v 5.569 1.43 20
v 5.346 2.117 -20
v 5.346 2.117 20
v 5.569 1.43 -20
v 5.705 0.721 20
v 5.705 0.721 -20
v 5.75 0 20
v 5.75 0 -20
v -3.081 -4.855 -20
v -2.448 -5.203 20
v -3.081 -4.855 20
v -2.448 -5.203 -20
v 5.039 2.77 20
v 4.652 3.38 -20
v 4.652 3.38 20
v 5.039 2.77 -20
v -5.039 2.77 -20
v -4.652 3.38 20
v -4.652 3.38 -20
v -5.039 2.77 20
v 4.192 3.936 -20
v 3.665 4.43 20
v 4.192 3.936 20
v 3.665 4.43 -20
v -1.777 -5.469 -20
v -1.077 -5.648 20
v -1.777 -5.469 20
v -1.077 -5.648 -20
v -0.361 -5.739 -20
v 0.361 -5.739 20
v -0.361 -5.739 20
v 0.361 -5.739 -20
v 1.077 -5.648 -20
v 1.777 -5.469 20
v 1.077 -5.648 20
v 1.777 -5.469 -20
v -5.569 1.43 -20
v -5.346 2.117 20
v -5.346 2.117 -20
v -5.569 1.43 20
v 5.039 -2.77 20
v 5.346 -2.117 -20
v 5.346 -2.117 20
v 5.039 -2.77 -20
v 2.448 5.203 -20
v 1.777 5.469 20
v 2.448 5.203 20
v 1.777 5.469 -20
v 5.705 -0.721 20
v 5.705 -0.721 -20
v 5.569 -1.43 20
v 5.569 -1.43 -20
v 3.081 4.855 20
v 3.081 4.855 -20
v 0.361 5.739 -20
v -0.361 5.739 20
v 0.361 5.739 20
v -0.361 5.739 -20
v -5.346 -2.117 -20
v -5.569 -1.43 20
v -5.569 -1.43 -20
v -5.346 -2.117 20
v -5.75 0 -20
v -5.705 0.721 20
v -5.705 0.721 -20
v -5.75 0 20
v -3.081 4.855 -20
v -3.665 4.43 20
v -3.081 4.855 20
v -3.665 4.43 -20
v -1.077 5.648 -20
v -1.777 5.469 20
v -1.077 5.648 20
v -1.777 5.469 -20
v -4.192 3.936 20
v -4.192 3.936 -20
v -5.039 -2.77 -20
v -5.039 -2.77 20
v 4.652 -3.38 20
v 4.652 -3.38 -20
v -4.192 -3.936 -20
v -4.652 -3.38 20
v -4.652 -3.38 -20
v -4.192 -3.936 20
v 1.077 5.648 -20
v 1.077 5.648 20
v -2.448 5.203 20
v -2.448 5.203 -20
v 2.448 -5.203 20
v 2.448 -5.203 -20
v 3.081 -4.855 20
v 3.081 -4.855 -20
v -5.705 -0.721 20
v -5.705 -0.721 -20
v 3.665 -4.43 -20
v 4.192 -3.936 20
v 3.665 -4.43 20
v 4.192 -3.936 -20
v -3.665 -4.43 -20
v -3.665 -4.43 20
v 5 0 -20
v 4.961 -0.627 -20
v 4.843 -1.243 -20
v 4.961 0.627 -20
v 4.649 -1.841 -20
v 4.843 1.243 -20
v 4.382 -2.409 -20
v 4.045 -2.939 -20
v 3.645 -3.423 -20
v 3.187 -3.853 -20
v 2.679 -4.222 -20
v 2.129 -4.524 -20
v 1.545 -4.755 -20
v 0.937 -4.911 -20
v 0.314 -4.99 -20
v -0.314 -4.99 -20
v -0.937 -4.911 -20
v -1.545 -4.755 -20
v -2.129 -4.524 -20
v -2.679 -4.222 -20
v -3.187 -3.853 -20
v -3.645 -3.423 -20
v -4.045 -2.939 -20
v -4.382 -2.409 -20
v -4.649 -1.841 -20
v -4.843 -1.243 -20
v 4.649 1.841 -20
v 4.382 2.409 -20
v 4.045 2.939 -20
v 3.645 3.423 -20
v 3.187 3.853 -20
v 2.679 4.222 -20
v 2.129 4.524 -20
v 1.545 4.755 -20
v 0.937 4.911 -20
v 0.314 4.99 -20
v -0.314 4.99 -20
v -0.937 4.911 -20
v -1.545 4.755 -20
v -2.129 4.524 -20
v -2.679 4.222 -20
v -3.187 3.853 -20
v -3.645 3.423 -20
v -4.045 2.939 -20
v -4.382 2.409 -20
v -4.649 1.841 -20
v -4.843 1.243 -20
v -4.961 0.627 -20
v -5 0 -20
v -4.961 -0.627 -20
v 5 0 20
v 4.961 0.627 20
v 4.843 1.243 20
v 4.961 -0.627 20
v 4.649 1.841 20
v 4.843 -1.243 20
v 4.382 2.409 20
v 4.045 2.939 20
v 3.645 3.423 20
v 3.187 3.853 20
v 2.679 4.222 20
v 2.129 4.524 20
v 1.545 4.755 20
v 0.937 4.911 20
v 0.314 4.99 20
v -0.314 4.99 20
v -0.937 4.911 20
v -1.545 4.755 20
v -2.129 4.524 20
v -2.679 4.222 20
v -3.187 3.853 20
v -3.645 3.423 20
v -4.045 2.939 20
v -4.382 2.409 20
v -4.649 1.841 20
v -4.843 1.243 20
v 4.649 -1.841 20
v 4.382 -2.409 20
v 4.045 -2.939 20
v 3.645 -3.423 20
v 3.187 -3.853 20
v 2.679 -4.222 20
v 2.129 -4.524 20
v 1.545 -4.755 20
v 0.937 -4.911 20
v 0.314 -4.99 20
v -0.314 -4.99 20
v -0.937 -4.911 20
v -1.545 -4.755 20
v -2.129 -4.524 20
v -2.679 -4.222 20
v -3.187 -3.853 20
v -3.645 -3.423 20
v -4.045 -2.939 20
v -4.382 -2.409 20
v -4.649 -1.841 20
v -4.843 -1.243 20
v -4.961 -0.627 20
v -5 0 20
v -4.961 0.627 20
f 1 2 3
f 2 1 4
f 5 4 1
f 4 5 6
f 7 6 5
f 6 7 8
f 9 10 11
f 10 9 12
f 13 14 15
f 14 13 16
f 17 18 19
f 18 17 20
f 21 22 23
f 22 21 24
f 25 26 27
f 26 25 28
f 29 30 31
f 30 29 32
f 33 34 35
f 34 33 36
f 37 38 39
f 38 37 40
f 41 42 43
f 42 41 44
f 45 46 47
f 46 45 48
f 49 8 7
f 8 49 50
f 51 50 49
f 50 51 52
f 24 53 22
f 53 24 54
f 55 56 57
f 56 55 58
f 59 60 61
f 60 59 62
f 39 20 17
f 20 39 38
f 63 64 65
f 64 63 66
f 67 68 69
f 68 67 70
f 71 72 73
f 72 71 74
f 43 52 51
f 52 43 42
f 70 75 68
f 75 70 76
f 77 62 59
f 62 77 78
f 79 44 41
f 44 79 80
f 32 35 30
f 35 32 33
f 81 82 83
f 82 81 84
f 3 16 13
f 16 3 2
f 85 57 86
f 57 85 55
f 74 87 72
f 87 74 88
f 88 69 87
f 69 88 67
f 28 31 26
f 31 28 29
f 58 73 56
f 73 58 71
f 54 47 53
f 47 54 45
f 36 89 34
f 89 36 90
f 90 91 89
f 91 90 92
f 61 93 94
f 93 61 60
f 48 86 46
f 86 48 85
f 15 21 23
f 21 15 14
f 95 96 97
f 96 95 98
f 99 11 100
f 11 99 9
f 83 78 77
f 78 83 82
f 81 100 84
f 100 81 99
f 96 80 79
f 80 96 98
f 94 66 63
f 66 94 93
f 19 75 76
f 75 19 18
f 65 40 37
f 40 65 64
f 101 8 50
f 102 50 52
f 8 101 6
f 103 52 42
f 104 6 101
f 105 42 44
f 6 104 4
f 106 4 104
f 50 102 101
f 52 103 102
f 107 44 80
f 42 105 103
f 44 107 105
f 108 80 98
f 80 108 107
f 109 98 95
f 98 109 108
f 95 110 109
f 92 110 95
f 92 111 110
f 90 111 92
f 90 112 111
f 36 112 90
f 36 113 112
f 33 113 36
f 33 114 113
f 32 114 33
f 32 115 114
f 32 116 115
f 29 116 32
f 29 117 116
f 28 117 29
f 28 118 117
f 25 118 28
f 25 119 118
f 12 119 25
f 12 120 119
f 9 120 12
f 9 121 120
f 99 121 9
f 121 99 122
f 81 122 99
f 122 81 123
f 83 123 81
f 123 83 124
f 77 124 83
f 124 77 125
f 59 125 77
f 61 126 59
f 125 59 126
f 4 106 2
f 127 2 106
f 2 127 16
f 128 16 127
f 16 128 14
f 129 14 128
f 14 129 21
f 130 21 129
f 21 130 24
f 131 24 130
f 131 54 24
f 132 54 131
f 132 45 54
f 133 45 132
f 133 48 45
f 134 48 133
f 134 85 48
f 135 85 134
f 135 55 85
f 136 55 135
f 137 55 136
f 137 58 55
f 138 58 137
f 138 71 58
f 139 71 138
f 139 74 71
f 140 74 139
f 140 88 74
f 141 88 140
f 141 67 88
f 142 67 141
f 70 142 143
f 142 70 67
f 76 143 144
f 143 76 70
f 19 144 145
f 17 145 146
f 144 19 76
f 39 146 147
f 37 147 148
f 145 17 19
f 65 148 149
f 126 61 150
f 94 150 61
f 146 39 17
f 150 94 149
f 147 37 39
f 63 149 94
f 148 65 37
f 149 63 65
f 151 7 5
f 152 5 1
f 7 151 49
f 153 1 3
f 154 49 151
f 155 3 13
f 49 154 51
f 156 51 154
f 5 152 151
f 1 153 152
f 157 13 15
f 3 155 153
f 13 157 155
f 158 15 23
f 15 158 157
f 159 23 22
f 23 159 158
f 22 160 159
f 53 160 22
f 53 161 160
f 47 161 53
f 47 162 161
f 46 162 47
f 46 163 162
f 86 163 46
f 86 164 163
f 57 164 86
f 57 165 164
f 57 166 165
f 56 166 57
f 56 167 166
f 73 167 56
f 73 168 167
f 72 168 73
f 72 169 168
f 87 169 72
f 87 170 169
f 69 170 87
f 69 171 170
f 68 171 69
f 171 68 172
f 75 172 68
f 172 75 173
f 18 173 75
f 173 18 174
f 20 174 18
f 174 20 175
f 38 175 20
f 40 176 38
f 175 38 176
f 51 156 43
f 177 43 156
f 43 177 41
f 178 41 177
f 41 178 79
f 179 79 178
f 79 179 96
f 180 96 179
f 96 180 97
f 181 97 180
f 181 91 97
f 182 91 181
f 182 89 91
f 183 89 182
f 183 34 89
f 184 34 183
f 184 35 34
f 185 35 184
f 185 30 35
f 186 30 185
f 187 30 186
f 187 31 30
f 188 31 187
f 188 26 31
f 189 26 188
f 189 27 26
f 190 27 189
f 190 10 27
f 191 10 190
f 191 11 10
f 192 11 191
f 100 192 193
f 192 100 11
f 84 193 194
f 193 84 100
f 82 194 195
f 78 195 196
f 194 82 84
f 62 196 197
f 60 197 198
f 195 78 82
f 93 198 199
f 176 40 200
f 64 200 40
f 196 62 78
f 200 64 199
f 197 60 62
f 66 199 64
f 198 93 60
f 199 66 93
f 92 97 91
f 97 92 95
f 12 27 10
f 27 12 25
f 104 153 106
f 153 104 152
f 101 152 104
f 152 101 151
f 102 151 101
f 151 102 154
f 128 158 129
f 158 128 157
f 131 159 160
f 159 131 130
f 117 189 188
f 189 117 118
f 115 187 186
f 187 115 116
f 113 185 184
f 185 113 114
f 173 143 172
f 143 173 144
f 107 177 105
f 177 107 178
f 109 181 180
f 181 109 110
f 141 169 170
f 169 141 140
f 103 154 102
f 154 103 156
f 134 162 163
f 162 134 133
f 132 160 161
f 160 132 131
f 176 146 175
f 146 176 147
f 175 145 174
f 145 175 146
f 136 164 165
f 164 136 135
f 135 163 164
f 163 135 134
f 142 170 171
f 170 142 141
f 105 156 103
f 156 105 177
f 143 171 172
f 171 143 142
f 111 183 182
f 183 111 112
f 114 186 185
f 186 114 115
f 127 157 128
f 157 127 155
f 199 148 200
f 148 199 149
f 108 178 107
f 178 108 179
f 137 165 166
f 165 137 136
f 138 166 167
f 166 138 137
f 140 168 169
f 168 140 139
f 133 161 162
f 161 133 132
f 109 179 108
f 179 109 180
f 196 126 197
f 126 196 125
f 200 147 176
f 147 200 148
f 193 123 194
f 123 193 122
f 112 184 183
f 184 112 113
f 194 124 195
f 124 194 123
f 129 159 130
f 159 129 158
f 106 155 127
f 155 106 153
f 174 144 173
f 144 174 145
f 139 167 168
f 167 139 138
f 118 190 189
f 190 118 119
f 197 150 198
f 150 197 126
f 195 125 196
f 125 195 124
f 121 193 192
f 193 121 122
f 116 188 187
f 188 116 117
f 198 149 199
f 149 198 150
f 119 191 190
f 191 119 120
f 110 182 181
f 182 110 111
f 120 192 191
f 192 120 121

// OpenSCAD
$fn = 50;


difference() {
	union() {
		translate(v = [0, 0, -20.0000000000]) {
			cylinder(h = 40, r = 5.7500000000);
		}
	}
	union() {
		translate(v = [0, 0, -100.0000000000]) {
			cylinder(h = 200, r = 5.0000000000);
		}
	}
}
